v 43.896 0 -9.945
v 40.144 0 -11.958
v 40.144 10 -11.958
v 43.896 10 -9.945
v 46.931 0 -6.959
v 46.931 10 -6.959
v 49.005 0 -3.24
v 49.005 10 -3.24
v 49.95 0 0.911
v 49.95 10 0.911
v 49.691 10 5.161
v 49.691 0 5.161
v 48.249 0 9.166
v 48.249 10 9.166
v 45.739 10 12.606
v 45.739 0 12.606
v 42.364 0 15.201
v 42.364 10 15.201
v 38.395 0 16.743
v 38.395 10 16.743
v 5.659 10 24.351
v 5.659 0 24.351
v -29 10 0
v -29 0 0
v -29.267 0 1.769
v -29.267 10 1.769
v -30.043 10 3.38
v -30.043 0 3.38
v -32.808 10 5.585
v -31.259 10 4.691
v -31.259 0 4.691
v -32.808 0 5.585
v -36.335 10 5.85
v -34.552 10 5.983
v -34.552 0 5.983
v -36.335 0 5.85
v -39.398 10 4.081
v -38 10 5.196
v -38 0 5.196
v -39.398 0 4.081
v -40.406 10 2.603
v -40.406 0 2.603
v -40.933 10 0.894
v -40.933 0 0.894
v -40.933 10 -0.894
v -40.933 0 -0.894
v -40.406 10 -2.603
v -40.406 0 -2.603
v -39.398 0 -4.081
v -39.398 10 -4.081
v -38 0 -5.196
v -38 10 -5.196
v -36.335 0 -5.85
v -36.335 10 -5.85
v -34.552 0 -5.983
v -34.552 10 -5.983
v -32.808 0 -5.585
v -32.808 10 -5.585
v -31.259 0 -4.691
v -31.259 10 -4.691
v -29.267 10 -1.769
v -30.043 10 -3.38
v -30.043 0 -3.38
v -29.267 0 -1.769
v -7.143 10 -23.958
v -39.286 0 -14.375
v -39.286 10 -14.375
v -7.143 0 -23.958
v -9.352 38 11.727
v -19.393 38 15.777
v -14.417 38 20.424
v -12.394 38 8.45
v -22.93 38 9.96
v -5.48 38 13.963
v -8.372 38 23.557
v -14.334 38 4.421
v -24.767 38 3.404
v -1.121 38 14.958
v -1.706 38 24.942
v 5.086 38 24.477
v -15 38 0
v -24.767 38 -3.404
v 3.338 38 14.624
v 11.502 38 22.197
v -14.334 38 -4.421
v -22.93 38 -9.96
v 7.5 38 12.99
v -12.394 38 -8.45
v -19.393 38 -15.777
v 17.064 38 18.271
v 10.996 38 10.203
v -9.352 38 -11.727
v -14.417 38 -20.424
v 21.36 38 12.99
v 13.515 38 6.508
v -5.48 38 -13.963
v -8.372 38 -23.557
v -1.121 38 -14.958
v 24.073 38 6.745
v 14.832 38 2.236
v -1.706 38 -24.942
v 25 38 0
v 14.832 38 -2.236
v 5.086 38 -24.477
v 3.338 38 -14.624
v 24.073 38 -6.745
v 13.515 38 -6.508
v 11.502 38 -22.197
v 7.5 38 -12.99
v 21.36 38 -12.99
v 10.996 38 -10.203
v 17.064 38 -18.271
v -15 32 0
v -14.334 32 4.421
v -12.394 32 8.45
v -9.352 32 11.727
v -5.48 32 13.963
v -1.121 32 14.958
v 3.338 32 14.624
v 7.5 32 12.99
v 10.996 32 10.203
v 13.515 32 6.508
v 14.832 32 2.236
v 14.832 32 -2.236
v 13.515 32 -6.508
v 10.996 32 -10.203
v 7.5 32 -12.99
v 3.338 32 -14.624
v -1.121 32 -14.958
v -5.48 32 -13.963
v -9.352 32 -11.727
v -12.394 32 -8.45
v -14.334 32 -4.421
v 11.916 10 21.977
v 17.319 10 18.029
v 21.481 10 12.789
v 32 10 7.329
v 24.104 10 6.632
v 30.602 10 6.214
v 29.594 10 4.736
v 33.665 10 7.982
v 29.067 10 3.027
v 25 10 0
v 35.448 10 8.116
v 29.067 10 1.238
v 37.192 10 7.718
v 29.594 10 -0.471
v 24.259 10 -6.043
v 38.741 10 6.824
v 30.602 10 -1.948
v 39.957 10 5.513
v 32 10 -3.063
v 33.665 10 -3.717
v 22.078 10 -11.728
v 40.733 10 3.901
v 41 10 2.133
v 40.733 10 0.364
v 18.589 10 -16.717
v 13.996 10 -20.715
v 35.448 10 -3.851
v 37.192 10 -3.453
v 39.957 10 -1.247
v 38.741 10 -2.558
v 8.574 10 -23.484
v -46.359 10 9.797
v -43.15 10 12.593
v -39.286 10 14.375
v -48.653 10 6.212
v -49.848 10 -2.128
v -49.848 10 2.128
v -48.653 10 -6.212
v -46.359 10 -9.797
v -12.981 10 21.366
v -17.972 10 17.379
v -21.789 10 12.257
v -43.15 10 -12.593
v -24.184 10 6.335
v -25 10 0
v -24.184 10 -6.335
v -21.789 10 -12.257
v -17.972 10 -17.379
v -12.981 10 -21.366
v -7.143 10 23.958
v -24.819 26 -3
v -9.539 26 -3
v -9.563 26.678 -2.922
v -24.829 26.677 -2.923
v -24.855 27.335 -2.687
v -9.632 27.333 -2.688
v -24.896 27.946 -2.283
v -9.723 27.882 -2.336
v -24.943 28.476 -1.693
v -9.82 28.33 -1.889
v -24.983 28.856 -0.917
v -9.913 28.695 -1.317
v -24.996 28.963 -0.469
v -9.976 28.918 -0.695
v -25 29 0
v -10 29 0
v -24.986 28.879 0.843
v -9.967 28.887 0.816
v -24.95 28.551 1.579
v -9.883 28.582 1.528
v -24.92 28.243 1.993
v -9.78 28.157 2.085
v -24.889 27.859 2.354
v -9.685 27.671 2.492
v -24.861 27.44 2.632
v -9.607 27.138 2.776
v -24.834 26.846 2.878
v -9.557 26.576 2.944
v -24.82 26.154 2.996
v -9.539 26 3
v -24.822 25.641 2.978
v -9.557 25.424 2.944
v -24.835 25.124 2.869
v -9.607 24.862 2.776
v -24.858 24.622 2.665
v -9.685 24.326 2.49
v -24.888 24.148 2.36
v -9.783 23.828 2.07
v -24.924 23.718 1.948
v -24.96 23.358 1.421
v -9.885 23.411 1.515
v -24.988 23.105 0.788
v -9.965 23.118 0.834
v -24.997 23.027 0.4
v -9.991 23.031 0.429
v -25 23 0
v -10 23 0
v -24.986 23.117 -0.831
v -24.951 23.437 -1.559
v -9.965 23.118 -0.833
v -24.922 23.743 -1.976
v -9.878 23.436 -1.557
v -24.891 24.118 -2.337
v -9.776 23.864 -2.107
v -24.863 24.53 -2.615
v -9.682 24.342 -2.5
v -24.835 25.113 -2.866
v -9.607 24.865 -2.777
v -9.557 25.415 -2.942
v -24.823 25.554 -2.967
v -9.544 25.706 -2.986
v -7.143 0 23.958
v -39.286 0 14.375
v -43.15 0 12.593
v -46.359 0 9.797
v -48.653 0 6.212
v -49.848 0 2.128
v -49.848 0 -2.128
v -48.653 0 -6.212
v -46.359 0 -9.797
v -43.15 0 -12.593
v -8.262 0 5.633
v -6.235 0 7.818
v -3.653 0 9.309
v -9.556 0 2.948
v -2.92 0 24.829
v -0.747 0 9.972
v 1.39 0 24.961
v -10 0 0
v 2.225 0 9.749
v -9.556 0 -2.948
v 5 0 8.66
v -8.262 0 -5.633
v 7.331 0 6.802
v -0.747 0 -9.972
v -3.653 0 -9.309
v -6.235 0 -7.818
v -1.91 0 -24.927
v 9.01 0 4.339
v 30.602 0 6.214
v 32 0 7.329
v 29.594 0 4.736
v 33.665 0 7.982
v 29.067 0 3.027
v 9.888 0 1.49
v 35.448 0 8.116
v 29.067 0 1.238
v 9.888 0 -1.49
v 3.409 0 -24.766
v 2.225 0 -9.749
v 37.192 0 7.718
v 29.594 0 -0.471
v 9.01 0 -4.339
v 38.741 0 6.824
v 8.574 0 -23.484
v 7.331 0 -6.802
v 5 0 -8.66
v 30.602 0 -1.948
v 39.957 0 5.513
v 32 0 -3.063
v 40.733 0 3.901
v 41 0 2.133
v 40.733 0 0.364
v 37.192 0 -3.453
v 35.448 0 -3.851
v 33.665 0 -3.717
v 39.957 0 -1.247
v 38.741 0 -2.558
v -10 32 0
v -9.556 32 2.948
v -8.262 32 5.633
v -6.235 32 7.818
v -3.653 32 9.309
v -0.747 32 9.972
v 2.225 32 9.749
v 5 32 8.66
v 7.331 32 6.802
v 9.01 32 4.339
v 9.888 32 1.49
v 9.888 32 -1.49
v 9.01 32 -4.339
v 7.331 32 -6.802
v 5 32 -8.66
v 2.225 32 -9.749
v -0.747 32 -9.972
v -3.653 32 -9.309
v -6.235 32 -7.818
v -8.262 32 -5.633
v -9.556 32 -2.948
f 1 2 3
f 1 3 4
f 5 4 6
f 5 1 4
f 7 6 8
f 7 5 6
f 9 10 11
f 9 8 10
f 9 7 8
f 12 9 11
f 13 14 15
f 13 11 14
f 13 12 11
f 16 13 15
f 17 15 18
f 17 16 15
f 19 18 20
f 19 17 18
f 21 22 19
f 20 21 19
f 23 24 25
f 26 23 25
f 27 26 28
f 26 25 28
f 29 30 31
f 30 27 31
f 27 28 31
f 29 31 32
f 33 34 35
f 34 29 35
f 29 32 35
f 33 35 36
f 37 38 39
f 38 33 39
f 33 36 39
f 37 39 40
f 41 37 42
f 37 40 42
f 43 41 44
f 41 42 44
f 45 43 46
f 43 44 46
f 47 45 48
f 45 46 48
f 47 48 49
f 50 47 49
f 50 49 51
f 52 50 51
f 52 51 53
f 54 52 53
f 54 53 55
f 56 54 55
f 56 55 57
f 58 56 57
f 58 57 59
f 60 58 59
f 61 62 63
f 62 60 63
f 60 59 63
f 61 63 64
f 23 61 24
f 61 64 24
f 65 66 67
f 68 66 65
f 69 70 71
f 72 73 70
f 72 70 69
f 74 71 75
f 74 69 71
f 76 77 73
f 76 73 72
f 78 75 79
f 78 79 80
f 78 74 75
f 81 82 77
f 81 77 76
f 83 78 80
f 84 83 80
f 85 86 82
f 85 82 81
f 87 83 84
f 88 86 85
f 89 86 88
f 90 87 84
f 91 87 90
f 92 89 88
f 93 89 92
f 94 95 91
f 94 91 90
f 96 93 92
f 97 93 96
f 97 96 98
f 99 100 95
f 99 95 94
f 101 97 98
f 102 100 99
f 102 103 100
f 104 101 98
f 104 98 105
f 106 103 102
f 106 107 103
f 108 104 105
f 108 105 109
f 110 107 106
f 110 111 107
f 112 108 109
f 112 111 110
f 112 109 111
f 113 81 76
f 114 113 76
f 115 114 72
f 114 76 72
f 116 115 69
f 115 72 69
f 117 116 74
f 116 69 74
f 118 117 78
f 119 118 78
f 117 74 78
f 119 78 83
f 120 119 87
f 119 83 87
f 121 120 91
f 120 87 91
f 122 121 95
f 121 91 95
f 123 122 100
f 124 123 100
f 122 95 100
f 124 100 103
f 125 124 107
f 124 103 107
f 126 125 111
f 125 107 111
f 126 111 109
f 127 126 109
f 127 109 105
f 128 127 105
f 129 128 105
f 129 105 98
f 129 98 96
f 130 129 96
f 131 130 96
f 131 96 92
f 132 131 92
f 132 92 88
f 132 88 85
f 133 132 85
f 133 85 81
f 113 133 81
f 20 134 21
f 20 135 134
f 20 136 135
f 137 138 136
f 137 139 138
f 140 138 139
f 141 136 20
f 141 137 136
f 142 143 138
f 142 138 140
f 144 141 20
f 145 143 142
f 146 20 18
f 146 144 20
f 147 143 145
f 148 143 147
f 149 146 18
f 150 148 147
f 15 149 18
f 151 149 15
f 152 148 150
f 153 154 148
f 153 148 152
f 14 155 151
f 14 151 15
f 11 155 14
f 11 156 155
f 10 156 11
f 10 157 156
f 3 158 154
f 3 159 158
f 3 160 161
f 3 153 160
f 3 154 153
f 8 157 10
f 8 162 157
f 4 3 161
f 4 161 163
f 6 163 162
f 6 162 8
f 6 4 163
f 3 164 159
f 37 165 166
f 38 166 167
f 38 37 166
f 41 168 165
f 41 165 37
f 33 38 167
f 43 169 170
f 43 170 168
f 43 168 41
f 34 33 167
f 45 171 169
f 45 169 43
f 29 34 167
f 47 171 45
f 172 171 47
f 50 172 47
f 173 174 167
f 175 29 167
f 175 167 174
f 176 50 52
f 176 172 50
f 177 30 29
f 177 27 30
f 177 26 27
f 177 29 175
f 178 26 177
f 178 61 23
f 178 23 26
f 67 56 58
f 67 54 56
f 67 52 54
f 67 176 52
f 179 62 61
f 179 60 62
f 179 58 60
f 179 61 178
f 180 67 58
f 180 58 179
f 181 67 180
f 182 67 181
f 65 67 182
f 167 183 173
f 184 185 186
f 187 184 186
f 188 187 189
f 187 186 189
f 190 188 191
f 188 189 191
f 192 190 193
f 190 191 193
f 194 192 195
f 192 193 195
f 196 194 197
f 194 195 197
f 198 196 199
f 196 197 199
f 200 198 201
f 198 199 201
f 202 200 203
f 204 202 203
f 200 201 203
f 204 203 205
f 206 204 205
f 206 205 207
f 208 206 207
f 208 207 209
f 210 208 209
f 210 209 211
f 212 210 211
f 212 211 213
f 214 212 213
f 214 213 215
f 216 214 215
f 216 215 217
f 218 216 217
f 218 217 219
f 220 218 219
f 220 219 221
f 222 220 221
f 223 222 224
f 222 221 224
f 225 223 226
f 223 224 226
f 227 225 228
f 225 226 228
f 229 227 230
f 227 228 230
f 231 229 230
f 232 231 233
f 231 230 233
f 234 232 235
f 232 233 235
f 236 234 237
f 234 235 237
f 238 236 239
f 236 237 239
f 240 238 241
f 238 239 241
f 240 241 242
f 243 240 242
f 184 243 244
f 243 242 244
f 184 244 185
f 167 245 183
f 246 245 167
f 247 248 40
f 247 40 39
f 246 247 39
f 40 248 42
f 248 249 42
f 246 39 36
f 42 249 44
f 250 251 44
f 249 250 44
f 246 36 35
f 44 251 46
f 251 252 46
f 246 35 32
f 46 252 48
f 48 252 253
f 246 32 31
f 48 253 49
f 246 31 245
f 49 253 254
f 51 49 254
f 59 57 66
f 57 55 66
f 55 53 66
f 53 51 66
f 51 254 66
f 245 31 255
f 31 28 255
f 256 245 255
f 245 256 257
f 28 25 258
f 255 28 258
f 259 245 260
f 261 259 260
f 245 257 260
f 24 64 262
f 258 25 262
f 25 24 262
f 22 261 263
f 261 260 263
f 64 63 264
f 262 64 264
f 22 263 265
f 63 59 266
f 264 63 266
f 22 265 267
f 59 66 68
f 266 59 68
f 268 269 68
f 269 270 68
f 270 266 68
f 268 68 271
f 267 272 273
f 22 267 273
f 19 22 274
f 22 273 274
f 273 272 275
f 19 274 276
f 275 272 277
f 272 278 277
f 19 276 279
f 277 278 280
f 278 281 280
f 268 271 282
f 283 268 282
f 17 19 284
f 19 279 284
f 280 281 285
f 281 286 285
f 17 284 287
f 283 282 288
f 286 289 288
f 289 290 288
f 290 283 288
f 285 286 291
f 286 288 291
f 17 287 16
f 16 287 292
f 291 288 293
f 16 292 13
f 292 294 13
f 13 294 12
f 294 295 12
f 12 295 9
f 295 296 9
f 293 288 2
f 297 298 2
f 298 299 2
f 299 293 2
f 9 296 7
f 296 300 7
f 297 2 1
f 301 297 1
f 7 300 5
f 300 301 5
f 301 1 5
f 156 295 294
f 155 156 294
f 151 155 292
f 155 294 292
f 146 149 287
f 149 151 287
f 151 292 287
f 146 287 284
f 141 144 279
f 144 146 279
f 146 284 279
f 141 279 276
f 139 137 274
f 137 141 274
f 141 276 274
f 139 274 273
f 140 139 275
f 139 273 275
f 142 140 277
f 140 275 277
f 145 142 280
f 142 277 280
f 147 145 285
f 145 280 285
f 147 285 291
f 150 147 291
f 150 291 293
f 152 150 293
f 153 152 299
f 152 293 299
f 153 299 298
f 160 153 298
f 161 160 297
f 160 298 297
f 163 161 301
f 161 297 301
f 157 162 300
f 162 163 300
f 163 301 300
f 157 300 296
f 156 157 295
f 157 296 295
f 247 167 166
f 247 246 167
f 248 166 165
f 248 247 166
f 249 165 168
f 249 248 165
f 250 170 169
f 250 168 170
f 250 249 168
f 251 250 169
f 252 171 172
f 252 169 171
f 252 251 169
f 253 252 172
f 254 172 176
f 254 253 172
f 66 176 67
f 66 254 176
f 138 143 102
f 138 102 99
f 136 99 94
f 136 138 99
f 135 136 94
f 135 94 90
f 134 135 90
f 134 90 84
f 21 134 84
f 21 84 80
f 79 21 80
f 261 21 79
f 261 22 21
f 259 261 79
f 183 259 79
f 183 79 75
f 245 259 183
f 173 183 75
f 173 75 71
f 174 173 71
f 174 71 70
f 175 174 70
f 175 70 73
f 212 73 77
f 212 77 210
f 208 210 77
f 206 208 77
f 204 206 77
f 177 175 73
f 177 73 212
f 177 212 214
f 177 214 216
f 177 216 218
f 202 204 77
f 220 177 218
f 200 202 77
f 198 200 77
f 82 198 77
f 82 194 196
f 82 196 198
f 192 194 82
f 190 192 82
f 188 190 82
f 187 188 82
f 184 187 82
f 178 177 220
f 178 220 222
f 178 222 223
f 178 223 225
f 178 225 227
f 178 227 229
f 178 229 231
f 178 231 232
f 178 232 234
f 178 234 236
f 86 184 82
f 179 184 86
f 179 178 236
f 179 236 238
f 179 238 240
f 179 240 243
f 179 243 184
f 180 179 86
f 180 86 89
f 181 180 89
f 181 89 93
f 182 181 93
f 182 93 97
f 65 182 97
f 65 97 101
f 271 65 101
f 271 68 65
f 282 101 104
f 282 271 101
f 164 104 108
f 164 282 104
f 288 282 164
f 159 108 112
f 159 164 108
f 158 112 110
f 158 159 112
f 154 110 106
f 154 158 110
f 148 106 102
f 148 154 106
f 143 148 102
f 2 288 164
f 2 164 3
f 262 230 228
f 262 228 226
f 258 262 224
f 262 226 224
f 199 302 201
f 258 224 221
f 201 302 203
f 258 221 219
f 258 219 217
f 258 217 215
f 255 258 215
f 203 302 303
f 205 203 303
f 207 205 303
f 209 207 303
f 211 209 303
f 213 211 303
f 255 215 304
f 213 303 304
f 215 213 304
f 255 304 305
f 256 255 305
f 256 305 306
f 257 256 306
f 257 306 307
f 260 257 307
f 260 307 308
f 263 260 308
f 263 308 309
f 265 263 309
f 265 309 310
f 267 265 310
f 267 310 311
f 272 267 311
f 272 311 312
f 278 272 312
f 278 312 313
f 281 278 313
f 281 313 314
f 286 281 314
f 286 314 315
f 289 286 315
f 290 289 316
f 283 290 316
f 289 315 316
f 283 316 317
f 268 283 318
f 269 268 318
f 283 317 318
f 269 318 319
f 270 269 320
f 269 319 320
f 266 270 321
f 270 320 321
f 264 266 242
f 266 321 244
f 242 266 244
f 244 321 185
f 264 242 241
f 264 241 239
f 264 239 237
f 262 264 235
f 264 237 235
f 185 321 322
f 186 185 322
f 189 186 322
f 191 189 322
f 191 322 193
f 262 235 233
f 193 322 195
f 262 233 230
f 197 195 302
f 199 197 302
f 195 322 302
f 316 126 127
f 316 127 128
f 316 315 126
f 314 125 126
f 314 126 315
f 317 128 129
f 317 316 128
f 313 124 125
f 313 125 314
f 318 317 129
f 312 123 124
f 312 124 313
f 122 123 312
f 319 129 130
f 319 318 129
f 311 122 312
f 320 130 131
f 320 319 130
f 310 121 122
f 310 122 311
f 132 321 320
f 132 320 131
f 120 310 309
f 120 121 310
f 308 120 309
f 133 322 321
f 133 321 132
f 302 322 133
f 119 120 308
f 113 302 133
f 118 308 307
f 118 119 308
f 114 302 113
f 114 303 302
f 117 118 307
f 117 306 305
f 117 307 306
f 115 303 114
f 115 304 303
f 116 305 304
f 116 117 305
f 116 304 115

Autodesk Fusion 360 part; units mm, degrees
sketch "Sketch1" plane through (0, 0, 0) normal (0, 1, 0) x (1, 0, 0)
  circle A0 centre (0, 0) radius 25
  circle A1 centre (0, 0) radius 15
  circle A2 centre (0, 0) radius 10
  circle A3 centre (-35, 0) radius 6
  circle A4 centre (35, -2.1327) radius 6
  arc A5 (-39.2857, 14.3747) -> (-39.2857, -14.3747) centre (-35, 0) ccw
  arc A6 (38.3954, -16.7434) -> (40.1443, 11.9576) centre (35, -2.1327) ccw
  line L0 (8.5738, 23.4838) -> (40.1443, 11.9576)
  line L1 (5.659, -24.3511) -> (38.3954, -16.7434)
  line L2 (-39.2857, 14.3747) -> (-7.1429, 23.9579)
  line L3 (-7.1429, -23.9579) -> (-39.2857, -14.3747)
  arc A7 (8.5738, 23.4838) -> (-7.1429, 23.9579) centre (0, 0) ccw
  arc A8 (-7.1429, -23.9579) -> (5.659, -24.3511) centre (0, 0) ccw
  dimension "d3" = 50
  dimension "d4" = 30
  dimension "d5" = 20
  dimension "d8" = 12
  dimension "d9" = 12
  dimension "d10" = 35
  dimension "d11" = 35
  dimension "d12" = 30
  dimension "d13" = 30
extrude "Extrude1" add sketch "Sketch1" along normal blind 10 contours A0 A6 L0 L1 | A0 A5 L2 L3 makes body 1 at (-31.6163, 0, 10.1046) makes body 2 at (31.0948, 10, 12.0614)
sketch "Sketch2" plane through (0, 0, 0) normal (0, 1, 0) x (1, 0, 0)
  circle A0 centre (0, 0) radius 25
  circle A1 centre (0, 0) radius 15
  dimension "d16" = 50
  dimension "d17" = 30
extrude "Extrude2" add sketch "Sketch2" along normal blind 38 bodies 1 2
sketch "Sketch3" plane through (0, 0, 0) normal (0, 1, 0) x (1, 0, 0)
  circle A0 centre (0, 0) radius 15
  dimension "d20" = 30
extrude "Extrude3" add sketch "Sketch3" along normal blind 38 bodies 1
sketch "Sketch4" plane through (0, 38, 0) normal (0, 1, 0) x (-1, 0, 0)
  circle A0 centre (0, 0) radius 25
  circle A1 centre (0, 0) radius 15
  circle A2 centre (0, 0) radius 10
  dimension "d23" = 30
  dimension "d24" = 20
extrude "Extrude4" cut sketch "Sketch4" along normal mid plane 12 contours A1 bodies 1
extrude "Extrude5" cut 1 faces at (2.7541, 38, -1.0148) along direction (0, 1, 0) mid plane 76 on bodies 1 bodies 1
sketch "Sketch5" plane through (0, 0, 0) normal (1, 0, 0) x (0, 0, -1)
  circle A0 centre (0, 26) radius 3
  point P0 (0, 38)
  dimension "d29" = 6
  dimension "d30" = 12
extrude "Extrude6" cut sketch "Sketch5" against normal blind 25 bodies 1
sketch "Sketch6" plane through (0, 0, 0) normal (1, 0, 0) x (0, 0, -1)
